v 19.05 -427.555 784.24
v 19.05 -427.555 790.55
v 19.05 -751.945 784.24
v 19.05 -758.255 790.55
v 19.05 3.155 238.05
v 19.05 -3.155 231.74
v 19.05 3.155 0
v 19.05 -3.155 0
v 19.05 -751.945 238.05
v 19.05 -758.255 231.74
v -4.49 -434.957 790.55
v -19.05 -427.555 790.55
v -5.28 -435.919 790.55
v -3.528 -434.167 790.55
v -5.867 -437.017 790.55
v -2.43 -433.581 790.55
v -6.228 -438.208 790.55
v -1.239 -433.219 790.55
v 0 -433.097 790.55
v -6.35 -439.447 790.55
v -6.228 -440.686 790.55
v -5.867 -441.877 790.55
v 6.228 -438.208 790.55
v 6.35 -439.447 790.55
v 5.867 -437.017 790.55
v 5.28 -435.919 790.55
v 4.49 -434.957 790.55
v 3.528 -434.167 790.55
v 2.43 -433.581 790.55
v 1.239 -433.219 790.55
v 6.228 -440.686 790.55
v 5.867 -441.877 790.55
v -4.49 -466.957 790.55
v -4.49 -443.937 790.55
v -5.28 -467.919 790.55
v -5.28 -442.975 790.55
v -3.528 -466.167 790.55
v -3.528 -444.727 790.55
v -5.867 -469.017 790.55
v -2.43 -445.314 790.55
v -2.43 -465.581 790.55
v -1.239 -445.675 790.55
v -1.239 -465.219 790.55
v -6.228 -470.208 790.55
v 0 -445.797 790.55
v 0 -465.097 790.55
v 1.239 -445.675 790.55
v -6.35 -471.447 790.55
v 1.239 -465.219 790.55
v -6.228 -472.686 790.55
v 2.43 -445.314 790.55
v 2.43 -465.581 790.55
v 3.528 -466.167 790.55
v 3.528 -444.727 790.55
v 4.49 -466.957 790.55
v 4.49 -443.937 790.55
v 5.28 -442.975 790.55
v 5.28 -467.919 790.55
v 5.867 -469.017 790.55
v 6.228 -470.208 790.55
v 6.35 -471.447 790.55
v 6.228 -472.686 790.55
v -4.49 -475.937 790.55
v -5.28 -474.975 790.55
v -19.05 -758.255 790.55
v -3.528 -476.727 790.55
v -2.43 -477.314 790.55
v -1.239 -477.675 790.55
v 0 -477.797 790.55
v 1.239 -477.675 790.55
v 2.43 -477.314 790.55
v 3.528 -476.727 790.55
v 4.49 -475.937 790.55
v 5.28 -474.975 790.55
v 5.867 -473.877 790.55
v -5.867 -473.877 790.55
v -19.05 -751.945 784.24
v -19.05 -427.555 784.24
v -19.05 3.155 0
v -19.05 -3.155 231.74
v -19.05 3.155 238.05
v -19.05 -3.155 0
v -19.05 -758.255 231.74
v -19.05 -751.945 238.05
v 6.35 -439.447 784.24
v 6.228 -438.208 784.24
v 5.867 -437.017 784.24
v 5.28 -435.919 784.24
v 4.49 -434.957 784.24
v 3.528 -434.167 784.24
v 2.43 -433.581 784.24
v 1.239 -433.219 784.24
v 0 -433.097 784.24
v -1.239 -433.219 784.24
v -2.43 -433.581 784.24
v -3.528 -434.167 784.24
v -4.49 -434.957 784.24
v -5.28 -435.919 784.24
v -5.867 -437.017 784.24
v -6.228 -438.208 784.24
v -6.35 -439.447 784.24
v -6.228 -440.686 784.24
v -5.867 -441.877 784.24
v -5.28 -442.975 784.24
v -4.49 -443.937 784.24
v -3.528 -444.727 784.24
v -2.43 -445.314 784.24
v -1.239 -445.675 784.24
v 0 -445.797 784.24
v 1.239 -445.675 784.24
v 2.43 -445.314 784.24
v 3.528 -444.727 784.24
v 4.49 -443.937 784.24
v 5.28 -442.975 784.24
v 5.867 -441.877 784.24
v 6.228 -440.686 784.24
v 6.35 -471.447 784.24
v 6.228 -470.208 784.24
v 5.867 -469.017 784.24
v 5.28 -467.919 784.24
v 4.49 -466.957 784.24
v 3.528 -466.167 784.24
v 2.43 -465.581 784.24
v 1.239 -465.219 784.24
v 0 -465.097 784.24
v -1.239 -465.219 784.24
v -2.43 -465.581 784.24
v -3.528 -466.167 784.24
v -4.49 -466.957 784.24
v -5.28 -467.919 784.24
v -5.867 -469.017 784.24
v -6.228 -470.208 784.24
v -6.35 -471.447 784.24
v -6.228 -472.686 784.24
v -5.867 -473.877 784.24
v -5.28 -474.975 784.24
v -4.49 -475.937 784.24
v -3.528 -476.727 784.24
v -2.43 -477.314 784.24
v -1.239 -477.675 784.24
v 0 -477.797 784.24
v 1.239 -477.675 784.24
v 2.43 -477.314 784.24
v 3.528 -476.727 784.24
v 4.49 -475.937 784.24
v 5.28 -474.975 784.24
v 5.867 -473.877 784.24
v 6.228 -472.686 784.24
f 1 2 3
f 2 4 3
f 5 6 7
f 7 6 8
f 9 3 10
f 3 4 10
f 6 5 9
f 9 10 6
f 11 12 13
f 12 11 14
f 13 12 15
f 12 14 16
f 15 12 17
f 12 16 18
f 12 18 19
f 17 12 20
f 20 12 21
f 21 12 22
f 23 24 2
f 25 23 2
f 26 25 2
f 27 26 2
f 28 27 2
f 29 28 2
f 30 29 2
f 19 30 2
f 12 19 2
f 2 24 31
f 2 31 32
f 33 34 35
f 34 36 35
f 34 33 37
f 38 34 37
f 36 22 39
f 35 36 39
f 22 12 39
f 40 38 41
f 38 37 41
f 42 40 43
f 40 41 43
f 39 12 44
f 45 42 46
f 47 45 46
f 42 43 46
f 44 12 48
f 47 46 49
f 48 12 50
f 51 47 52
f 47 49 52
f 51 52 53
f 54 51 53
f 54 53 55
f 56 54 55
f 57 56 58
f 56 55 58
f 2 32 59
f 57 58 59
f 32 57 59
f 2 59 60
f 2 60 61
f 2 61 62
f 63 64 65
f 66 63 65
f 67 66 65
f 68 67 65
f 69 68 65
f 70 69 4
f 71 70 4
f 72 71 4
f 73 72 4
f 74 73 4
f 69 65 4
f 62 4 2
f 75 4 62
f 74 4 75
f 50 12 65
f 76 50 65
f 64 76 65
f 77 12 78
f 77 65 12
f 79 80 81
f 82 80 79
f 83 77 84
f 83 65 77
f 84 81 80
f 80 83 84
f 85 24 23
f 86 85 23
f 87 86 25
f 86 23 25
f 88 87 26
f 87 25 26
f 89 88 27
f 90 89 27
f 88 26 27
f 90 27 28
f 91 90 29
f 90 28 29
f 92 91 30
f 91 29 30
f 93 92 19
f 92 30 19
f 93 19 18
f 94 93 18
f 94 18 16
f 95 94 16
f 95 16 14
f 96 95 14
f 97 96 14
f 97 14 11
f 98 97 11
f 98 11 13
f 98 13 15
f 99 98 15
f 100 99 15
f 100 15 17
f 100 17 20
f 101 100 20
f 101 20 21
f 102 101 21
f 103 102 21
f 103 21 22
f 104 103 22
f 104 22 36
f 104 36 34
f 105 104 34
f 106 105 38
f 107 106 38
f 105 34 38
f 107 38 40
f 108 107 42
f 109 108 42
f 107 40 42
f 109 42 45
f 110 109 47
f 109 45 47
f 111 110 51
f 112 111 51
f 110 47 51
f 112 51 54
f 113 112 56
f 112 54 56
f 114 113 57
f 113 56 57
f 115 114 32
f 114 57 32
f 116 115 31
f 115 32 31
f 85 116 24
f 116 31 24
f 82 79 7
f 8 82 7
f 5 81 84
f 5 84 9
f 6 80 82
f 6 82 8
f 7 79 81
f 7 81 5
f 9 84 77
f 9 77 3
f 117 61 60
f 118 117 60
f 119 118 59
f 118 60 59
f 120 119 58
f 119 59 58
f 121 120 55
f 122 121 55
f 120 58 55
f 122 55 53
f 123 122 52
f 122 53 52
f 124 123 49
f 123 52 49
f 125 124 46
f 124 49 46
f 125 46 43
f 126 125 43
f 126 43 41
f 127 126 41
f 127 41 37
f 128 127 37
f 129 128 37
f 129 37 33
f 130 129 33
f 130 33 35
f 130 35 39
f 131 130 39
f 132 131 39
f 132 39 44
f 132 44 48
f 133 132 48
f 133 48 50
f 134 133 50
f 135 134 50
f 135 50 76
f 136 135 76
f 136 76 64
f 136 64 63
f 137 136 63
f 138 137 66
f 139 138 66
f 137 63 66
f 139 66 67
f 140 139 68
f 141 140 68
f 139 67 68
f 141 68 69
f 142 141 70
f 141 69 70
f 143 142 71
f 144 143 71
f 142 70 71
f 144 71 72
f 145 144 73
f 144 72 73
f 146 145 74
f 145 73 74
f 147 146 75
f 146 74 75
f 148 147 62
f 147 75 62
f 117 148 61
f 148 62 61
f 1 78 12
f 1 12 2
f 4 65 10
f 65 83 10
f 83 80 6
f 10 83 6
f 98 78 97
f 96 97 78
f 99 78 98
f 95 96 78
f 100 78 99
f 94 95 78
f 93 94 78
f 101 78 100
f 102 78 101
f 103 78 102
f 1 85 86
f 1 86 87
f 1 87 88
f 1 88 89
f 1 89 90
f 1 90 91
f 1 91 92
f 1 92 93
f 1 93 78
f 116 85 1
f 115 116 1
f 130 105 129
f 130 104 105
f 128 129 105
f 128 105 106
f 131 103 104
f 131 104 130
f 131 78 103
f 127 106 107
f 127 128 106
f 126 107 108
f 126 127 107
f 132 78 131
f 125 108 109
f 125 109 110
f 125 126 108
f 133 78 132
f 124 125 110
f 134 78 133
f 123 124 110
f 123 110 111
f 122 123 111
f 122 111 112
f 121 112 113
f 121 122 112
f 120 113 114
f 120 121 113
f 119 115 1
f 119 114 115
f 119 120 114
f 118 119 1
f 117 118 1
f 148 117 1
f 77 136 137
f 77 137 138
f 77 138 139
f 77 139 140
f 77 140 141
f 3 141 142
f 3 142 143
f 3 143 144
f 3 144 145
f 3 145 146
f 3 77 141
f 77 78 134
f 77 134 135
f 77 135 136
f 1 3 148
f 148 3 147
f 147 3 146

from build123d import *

# Parameters (mm, degrees)
CROQUIS1_W              = 38.1
CROQUIS1_H              = 6.31
SALIENTE_EXTRUIR1_DEPTH = 238.05
CROQUIS2_W              = 38.1
CROQUIS2_H              = 6.31
SALIENTE_EXTRUIR2_DEPTH = 755.1
CROQUIS3_W              = 38.1
CROQUIS3_H              = 6.31
SALIENTE_EXTRUIR3_DEPTH = 552.5
CROQUIS4_W              = 38.1
CROQUIS4_H              = 6.31
SALIENTE_EXTRUIR4_DEPTH = 314.39
CROQUIS6_W              = 38.1
CROQUIS6_H              = 6.31
SALIENTE_EXTRUIR5_DEPTH = 10
CROQUIS8_R              = 6.35
CORTAR_EXTRUIR1_DEPTH   = 10


with BuildPart() as part:
    # Croquis1 → Saliente-Extruir1 (new body)
    with BuildSketch(Plane.XY):
        Rectangle(CROQUIS1_W, CROQUIS1_H)
    extrude(amount=SALIENTE_EXTRUIR1_DEPTH)

    # Croquis2 → Saliente-Extruir2 (add)
    with BuildSketch(Plane.XZ.offset(3.155)):
        with Locations((0, 234.895)):
            Rectangle(CROQUIS2_W, CROQUIS2_H)
    extrude(amount=SALIENTE_EXTRUIR2_DEPTH)

    # Croquis3 → Saliente-Extruir3 (add)
    with BuildSketch(Plane.XY.offset(238.05)):
        with Locations((0, -755.1)):
            Rectangle(CROQUIS3_W, CROQUIS3_H)
    extrude(amount=SALIENTE_EXTRUIR3_DEPTH)

    # Croquis4 → Saliente-Extruir4 (add)
    with BuildSketch(Plane(origin=(0, -751.945, 0), x_dir=(1, 0, 0), z_dir=(0, 1, 0))):
        with Locations((0, -787.395)):
            Rectangle(CROQUIS4_W, CROQUIS4_H)
    extrude(amount=SALIENTE_EXTRUIR4_DEPTH)

    # Croquis6 → Saliente-Extruir5 (add)
    with BuildSketch(Plane(origin=(0, -437.555, 0), x_dir=(1, 0, 0), z_dir=(0, 1, 0))):
        with Locations((0, -787.395)):
            Rectangle(CROQUIS6_W, CROQUIS6_H)
    extrude(amount=SALIENTE_EXTRUIR5_DEPTH)

    # Croquis8 → Cortar-Extruir1 (cut)
    with BuildSketch(Plane.XY.offset(790.55)):
        with Locations((0, -471.447204666)):
            Circle(CROQUIS8_R)
        with Locations((0, -439.447204666)):
            Circle(CROQUIS8_R)
    extrude(amount=-CORTAR_EXTRUIR1_DEPTH, mode=Mode.SUBTRACT)


solid = part.part
